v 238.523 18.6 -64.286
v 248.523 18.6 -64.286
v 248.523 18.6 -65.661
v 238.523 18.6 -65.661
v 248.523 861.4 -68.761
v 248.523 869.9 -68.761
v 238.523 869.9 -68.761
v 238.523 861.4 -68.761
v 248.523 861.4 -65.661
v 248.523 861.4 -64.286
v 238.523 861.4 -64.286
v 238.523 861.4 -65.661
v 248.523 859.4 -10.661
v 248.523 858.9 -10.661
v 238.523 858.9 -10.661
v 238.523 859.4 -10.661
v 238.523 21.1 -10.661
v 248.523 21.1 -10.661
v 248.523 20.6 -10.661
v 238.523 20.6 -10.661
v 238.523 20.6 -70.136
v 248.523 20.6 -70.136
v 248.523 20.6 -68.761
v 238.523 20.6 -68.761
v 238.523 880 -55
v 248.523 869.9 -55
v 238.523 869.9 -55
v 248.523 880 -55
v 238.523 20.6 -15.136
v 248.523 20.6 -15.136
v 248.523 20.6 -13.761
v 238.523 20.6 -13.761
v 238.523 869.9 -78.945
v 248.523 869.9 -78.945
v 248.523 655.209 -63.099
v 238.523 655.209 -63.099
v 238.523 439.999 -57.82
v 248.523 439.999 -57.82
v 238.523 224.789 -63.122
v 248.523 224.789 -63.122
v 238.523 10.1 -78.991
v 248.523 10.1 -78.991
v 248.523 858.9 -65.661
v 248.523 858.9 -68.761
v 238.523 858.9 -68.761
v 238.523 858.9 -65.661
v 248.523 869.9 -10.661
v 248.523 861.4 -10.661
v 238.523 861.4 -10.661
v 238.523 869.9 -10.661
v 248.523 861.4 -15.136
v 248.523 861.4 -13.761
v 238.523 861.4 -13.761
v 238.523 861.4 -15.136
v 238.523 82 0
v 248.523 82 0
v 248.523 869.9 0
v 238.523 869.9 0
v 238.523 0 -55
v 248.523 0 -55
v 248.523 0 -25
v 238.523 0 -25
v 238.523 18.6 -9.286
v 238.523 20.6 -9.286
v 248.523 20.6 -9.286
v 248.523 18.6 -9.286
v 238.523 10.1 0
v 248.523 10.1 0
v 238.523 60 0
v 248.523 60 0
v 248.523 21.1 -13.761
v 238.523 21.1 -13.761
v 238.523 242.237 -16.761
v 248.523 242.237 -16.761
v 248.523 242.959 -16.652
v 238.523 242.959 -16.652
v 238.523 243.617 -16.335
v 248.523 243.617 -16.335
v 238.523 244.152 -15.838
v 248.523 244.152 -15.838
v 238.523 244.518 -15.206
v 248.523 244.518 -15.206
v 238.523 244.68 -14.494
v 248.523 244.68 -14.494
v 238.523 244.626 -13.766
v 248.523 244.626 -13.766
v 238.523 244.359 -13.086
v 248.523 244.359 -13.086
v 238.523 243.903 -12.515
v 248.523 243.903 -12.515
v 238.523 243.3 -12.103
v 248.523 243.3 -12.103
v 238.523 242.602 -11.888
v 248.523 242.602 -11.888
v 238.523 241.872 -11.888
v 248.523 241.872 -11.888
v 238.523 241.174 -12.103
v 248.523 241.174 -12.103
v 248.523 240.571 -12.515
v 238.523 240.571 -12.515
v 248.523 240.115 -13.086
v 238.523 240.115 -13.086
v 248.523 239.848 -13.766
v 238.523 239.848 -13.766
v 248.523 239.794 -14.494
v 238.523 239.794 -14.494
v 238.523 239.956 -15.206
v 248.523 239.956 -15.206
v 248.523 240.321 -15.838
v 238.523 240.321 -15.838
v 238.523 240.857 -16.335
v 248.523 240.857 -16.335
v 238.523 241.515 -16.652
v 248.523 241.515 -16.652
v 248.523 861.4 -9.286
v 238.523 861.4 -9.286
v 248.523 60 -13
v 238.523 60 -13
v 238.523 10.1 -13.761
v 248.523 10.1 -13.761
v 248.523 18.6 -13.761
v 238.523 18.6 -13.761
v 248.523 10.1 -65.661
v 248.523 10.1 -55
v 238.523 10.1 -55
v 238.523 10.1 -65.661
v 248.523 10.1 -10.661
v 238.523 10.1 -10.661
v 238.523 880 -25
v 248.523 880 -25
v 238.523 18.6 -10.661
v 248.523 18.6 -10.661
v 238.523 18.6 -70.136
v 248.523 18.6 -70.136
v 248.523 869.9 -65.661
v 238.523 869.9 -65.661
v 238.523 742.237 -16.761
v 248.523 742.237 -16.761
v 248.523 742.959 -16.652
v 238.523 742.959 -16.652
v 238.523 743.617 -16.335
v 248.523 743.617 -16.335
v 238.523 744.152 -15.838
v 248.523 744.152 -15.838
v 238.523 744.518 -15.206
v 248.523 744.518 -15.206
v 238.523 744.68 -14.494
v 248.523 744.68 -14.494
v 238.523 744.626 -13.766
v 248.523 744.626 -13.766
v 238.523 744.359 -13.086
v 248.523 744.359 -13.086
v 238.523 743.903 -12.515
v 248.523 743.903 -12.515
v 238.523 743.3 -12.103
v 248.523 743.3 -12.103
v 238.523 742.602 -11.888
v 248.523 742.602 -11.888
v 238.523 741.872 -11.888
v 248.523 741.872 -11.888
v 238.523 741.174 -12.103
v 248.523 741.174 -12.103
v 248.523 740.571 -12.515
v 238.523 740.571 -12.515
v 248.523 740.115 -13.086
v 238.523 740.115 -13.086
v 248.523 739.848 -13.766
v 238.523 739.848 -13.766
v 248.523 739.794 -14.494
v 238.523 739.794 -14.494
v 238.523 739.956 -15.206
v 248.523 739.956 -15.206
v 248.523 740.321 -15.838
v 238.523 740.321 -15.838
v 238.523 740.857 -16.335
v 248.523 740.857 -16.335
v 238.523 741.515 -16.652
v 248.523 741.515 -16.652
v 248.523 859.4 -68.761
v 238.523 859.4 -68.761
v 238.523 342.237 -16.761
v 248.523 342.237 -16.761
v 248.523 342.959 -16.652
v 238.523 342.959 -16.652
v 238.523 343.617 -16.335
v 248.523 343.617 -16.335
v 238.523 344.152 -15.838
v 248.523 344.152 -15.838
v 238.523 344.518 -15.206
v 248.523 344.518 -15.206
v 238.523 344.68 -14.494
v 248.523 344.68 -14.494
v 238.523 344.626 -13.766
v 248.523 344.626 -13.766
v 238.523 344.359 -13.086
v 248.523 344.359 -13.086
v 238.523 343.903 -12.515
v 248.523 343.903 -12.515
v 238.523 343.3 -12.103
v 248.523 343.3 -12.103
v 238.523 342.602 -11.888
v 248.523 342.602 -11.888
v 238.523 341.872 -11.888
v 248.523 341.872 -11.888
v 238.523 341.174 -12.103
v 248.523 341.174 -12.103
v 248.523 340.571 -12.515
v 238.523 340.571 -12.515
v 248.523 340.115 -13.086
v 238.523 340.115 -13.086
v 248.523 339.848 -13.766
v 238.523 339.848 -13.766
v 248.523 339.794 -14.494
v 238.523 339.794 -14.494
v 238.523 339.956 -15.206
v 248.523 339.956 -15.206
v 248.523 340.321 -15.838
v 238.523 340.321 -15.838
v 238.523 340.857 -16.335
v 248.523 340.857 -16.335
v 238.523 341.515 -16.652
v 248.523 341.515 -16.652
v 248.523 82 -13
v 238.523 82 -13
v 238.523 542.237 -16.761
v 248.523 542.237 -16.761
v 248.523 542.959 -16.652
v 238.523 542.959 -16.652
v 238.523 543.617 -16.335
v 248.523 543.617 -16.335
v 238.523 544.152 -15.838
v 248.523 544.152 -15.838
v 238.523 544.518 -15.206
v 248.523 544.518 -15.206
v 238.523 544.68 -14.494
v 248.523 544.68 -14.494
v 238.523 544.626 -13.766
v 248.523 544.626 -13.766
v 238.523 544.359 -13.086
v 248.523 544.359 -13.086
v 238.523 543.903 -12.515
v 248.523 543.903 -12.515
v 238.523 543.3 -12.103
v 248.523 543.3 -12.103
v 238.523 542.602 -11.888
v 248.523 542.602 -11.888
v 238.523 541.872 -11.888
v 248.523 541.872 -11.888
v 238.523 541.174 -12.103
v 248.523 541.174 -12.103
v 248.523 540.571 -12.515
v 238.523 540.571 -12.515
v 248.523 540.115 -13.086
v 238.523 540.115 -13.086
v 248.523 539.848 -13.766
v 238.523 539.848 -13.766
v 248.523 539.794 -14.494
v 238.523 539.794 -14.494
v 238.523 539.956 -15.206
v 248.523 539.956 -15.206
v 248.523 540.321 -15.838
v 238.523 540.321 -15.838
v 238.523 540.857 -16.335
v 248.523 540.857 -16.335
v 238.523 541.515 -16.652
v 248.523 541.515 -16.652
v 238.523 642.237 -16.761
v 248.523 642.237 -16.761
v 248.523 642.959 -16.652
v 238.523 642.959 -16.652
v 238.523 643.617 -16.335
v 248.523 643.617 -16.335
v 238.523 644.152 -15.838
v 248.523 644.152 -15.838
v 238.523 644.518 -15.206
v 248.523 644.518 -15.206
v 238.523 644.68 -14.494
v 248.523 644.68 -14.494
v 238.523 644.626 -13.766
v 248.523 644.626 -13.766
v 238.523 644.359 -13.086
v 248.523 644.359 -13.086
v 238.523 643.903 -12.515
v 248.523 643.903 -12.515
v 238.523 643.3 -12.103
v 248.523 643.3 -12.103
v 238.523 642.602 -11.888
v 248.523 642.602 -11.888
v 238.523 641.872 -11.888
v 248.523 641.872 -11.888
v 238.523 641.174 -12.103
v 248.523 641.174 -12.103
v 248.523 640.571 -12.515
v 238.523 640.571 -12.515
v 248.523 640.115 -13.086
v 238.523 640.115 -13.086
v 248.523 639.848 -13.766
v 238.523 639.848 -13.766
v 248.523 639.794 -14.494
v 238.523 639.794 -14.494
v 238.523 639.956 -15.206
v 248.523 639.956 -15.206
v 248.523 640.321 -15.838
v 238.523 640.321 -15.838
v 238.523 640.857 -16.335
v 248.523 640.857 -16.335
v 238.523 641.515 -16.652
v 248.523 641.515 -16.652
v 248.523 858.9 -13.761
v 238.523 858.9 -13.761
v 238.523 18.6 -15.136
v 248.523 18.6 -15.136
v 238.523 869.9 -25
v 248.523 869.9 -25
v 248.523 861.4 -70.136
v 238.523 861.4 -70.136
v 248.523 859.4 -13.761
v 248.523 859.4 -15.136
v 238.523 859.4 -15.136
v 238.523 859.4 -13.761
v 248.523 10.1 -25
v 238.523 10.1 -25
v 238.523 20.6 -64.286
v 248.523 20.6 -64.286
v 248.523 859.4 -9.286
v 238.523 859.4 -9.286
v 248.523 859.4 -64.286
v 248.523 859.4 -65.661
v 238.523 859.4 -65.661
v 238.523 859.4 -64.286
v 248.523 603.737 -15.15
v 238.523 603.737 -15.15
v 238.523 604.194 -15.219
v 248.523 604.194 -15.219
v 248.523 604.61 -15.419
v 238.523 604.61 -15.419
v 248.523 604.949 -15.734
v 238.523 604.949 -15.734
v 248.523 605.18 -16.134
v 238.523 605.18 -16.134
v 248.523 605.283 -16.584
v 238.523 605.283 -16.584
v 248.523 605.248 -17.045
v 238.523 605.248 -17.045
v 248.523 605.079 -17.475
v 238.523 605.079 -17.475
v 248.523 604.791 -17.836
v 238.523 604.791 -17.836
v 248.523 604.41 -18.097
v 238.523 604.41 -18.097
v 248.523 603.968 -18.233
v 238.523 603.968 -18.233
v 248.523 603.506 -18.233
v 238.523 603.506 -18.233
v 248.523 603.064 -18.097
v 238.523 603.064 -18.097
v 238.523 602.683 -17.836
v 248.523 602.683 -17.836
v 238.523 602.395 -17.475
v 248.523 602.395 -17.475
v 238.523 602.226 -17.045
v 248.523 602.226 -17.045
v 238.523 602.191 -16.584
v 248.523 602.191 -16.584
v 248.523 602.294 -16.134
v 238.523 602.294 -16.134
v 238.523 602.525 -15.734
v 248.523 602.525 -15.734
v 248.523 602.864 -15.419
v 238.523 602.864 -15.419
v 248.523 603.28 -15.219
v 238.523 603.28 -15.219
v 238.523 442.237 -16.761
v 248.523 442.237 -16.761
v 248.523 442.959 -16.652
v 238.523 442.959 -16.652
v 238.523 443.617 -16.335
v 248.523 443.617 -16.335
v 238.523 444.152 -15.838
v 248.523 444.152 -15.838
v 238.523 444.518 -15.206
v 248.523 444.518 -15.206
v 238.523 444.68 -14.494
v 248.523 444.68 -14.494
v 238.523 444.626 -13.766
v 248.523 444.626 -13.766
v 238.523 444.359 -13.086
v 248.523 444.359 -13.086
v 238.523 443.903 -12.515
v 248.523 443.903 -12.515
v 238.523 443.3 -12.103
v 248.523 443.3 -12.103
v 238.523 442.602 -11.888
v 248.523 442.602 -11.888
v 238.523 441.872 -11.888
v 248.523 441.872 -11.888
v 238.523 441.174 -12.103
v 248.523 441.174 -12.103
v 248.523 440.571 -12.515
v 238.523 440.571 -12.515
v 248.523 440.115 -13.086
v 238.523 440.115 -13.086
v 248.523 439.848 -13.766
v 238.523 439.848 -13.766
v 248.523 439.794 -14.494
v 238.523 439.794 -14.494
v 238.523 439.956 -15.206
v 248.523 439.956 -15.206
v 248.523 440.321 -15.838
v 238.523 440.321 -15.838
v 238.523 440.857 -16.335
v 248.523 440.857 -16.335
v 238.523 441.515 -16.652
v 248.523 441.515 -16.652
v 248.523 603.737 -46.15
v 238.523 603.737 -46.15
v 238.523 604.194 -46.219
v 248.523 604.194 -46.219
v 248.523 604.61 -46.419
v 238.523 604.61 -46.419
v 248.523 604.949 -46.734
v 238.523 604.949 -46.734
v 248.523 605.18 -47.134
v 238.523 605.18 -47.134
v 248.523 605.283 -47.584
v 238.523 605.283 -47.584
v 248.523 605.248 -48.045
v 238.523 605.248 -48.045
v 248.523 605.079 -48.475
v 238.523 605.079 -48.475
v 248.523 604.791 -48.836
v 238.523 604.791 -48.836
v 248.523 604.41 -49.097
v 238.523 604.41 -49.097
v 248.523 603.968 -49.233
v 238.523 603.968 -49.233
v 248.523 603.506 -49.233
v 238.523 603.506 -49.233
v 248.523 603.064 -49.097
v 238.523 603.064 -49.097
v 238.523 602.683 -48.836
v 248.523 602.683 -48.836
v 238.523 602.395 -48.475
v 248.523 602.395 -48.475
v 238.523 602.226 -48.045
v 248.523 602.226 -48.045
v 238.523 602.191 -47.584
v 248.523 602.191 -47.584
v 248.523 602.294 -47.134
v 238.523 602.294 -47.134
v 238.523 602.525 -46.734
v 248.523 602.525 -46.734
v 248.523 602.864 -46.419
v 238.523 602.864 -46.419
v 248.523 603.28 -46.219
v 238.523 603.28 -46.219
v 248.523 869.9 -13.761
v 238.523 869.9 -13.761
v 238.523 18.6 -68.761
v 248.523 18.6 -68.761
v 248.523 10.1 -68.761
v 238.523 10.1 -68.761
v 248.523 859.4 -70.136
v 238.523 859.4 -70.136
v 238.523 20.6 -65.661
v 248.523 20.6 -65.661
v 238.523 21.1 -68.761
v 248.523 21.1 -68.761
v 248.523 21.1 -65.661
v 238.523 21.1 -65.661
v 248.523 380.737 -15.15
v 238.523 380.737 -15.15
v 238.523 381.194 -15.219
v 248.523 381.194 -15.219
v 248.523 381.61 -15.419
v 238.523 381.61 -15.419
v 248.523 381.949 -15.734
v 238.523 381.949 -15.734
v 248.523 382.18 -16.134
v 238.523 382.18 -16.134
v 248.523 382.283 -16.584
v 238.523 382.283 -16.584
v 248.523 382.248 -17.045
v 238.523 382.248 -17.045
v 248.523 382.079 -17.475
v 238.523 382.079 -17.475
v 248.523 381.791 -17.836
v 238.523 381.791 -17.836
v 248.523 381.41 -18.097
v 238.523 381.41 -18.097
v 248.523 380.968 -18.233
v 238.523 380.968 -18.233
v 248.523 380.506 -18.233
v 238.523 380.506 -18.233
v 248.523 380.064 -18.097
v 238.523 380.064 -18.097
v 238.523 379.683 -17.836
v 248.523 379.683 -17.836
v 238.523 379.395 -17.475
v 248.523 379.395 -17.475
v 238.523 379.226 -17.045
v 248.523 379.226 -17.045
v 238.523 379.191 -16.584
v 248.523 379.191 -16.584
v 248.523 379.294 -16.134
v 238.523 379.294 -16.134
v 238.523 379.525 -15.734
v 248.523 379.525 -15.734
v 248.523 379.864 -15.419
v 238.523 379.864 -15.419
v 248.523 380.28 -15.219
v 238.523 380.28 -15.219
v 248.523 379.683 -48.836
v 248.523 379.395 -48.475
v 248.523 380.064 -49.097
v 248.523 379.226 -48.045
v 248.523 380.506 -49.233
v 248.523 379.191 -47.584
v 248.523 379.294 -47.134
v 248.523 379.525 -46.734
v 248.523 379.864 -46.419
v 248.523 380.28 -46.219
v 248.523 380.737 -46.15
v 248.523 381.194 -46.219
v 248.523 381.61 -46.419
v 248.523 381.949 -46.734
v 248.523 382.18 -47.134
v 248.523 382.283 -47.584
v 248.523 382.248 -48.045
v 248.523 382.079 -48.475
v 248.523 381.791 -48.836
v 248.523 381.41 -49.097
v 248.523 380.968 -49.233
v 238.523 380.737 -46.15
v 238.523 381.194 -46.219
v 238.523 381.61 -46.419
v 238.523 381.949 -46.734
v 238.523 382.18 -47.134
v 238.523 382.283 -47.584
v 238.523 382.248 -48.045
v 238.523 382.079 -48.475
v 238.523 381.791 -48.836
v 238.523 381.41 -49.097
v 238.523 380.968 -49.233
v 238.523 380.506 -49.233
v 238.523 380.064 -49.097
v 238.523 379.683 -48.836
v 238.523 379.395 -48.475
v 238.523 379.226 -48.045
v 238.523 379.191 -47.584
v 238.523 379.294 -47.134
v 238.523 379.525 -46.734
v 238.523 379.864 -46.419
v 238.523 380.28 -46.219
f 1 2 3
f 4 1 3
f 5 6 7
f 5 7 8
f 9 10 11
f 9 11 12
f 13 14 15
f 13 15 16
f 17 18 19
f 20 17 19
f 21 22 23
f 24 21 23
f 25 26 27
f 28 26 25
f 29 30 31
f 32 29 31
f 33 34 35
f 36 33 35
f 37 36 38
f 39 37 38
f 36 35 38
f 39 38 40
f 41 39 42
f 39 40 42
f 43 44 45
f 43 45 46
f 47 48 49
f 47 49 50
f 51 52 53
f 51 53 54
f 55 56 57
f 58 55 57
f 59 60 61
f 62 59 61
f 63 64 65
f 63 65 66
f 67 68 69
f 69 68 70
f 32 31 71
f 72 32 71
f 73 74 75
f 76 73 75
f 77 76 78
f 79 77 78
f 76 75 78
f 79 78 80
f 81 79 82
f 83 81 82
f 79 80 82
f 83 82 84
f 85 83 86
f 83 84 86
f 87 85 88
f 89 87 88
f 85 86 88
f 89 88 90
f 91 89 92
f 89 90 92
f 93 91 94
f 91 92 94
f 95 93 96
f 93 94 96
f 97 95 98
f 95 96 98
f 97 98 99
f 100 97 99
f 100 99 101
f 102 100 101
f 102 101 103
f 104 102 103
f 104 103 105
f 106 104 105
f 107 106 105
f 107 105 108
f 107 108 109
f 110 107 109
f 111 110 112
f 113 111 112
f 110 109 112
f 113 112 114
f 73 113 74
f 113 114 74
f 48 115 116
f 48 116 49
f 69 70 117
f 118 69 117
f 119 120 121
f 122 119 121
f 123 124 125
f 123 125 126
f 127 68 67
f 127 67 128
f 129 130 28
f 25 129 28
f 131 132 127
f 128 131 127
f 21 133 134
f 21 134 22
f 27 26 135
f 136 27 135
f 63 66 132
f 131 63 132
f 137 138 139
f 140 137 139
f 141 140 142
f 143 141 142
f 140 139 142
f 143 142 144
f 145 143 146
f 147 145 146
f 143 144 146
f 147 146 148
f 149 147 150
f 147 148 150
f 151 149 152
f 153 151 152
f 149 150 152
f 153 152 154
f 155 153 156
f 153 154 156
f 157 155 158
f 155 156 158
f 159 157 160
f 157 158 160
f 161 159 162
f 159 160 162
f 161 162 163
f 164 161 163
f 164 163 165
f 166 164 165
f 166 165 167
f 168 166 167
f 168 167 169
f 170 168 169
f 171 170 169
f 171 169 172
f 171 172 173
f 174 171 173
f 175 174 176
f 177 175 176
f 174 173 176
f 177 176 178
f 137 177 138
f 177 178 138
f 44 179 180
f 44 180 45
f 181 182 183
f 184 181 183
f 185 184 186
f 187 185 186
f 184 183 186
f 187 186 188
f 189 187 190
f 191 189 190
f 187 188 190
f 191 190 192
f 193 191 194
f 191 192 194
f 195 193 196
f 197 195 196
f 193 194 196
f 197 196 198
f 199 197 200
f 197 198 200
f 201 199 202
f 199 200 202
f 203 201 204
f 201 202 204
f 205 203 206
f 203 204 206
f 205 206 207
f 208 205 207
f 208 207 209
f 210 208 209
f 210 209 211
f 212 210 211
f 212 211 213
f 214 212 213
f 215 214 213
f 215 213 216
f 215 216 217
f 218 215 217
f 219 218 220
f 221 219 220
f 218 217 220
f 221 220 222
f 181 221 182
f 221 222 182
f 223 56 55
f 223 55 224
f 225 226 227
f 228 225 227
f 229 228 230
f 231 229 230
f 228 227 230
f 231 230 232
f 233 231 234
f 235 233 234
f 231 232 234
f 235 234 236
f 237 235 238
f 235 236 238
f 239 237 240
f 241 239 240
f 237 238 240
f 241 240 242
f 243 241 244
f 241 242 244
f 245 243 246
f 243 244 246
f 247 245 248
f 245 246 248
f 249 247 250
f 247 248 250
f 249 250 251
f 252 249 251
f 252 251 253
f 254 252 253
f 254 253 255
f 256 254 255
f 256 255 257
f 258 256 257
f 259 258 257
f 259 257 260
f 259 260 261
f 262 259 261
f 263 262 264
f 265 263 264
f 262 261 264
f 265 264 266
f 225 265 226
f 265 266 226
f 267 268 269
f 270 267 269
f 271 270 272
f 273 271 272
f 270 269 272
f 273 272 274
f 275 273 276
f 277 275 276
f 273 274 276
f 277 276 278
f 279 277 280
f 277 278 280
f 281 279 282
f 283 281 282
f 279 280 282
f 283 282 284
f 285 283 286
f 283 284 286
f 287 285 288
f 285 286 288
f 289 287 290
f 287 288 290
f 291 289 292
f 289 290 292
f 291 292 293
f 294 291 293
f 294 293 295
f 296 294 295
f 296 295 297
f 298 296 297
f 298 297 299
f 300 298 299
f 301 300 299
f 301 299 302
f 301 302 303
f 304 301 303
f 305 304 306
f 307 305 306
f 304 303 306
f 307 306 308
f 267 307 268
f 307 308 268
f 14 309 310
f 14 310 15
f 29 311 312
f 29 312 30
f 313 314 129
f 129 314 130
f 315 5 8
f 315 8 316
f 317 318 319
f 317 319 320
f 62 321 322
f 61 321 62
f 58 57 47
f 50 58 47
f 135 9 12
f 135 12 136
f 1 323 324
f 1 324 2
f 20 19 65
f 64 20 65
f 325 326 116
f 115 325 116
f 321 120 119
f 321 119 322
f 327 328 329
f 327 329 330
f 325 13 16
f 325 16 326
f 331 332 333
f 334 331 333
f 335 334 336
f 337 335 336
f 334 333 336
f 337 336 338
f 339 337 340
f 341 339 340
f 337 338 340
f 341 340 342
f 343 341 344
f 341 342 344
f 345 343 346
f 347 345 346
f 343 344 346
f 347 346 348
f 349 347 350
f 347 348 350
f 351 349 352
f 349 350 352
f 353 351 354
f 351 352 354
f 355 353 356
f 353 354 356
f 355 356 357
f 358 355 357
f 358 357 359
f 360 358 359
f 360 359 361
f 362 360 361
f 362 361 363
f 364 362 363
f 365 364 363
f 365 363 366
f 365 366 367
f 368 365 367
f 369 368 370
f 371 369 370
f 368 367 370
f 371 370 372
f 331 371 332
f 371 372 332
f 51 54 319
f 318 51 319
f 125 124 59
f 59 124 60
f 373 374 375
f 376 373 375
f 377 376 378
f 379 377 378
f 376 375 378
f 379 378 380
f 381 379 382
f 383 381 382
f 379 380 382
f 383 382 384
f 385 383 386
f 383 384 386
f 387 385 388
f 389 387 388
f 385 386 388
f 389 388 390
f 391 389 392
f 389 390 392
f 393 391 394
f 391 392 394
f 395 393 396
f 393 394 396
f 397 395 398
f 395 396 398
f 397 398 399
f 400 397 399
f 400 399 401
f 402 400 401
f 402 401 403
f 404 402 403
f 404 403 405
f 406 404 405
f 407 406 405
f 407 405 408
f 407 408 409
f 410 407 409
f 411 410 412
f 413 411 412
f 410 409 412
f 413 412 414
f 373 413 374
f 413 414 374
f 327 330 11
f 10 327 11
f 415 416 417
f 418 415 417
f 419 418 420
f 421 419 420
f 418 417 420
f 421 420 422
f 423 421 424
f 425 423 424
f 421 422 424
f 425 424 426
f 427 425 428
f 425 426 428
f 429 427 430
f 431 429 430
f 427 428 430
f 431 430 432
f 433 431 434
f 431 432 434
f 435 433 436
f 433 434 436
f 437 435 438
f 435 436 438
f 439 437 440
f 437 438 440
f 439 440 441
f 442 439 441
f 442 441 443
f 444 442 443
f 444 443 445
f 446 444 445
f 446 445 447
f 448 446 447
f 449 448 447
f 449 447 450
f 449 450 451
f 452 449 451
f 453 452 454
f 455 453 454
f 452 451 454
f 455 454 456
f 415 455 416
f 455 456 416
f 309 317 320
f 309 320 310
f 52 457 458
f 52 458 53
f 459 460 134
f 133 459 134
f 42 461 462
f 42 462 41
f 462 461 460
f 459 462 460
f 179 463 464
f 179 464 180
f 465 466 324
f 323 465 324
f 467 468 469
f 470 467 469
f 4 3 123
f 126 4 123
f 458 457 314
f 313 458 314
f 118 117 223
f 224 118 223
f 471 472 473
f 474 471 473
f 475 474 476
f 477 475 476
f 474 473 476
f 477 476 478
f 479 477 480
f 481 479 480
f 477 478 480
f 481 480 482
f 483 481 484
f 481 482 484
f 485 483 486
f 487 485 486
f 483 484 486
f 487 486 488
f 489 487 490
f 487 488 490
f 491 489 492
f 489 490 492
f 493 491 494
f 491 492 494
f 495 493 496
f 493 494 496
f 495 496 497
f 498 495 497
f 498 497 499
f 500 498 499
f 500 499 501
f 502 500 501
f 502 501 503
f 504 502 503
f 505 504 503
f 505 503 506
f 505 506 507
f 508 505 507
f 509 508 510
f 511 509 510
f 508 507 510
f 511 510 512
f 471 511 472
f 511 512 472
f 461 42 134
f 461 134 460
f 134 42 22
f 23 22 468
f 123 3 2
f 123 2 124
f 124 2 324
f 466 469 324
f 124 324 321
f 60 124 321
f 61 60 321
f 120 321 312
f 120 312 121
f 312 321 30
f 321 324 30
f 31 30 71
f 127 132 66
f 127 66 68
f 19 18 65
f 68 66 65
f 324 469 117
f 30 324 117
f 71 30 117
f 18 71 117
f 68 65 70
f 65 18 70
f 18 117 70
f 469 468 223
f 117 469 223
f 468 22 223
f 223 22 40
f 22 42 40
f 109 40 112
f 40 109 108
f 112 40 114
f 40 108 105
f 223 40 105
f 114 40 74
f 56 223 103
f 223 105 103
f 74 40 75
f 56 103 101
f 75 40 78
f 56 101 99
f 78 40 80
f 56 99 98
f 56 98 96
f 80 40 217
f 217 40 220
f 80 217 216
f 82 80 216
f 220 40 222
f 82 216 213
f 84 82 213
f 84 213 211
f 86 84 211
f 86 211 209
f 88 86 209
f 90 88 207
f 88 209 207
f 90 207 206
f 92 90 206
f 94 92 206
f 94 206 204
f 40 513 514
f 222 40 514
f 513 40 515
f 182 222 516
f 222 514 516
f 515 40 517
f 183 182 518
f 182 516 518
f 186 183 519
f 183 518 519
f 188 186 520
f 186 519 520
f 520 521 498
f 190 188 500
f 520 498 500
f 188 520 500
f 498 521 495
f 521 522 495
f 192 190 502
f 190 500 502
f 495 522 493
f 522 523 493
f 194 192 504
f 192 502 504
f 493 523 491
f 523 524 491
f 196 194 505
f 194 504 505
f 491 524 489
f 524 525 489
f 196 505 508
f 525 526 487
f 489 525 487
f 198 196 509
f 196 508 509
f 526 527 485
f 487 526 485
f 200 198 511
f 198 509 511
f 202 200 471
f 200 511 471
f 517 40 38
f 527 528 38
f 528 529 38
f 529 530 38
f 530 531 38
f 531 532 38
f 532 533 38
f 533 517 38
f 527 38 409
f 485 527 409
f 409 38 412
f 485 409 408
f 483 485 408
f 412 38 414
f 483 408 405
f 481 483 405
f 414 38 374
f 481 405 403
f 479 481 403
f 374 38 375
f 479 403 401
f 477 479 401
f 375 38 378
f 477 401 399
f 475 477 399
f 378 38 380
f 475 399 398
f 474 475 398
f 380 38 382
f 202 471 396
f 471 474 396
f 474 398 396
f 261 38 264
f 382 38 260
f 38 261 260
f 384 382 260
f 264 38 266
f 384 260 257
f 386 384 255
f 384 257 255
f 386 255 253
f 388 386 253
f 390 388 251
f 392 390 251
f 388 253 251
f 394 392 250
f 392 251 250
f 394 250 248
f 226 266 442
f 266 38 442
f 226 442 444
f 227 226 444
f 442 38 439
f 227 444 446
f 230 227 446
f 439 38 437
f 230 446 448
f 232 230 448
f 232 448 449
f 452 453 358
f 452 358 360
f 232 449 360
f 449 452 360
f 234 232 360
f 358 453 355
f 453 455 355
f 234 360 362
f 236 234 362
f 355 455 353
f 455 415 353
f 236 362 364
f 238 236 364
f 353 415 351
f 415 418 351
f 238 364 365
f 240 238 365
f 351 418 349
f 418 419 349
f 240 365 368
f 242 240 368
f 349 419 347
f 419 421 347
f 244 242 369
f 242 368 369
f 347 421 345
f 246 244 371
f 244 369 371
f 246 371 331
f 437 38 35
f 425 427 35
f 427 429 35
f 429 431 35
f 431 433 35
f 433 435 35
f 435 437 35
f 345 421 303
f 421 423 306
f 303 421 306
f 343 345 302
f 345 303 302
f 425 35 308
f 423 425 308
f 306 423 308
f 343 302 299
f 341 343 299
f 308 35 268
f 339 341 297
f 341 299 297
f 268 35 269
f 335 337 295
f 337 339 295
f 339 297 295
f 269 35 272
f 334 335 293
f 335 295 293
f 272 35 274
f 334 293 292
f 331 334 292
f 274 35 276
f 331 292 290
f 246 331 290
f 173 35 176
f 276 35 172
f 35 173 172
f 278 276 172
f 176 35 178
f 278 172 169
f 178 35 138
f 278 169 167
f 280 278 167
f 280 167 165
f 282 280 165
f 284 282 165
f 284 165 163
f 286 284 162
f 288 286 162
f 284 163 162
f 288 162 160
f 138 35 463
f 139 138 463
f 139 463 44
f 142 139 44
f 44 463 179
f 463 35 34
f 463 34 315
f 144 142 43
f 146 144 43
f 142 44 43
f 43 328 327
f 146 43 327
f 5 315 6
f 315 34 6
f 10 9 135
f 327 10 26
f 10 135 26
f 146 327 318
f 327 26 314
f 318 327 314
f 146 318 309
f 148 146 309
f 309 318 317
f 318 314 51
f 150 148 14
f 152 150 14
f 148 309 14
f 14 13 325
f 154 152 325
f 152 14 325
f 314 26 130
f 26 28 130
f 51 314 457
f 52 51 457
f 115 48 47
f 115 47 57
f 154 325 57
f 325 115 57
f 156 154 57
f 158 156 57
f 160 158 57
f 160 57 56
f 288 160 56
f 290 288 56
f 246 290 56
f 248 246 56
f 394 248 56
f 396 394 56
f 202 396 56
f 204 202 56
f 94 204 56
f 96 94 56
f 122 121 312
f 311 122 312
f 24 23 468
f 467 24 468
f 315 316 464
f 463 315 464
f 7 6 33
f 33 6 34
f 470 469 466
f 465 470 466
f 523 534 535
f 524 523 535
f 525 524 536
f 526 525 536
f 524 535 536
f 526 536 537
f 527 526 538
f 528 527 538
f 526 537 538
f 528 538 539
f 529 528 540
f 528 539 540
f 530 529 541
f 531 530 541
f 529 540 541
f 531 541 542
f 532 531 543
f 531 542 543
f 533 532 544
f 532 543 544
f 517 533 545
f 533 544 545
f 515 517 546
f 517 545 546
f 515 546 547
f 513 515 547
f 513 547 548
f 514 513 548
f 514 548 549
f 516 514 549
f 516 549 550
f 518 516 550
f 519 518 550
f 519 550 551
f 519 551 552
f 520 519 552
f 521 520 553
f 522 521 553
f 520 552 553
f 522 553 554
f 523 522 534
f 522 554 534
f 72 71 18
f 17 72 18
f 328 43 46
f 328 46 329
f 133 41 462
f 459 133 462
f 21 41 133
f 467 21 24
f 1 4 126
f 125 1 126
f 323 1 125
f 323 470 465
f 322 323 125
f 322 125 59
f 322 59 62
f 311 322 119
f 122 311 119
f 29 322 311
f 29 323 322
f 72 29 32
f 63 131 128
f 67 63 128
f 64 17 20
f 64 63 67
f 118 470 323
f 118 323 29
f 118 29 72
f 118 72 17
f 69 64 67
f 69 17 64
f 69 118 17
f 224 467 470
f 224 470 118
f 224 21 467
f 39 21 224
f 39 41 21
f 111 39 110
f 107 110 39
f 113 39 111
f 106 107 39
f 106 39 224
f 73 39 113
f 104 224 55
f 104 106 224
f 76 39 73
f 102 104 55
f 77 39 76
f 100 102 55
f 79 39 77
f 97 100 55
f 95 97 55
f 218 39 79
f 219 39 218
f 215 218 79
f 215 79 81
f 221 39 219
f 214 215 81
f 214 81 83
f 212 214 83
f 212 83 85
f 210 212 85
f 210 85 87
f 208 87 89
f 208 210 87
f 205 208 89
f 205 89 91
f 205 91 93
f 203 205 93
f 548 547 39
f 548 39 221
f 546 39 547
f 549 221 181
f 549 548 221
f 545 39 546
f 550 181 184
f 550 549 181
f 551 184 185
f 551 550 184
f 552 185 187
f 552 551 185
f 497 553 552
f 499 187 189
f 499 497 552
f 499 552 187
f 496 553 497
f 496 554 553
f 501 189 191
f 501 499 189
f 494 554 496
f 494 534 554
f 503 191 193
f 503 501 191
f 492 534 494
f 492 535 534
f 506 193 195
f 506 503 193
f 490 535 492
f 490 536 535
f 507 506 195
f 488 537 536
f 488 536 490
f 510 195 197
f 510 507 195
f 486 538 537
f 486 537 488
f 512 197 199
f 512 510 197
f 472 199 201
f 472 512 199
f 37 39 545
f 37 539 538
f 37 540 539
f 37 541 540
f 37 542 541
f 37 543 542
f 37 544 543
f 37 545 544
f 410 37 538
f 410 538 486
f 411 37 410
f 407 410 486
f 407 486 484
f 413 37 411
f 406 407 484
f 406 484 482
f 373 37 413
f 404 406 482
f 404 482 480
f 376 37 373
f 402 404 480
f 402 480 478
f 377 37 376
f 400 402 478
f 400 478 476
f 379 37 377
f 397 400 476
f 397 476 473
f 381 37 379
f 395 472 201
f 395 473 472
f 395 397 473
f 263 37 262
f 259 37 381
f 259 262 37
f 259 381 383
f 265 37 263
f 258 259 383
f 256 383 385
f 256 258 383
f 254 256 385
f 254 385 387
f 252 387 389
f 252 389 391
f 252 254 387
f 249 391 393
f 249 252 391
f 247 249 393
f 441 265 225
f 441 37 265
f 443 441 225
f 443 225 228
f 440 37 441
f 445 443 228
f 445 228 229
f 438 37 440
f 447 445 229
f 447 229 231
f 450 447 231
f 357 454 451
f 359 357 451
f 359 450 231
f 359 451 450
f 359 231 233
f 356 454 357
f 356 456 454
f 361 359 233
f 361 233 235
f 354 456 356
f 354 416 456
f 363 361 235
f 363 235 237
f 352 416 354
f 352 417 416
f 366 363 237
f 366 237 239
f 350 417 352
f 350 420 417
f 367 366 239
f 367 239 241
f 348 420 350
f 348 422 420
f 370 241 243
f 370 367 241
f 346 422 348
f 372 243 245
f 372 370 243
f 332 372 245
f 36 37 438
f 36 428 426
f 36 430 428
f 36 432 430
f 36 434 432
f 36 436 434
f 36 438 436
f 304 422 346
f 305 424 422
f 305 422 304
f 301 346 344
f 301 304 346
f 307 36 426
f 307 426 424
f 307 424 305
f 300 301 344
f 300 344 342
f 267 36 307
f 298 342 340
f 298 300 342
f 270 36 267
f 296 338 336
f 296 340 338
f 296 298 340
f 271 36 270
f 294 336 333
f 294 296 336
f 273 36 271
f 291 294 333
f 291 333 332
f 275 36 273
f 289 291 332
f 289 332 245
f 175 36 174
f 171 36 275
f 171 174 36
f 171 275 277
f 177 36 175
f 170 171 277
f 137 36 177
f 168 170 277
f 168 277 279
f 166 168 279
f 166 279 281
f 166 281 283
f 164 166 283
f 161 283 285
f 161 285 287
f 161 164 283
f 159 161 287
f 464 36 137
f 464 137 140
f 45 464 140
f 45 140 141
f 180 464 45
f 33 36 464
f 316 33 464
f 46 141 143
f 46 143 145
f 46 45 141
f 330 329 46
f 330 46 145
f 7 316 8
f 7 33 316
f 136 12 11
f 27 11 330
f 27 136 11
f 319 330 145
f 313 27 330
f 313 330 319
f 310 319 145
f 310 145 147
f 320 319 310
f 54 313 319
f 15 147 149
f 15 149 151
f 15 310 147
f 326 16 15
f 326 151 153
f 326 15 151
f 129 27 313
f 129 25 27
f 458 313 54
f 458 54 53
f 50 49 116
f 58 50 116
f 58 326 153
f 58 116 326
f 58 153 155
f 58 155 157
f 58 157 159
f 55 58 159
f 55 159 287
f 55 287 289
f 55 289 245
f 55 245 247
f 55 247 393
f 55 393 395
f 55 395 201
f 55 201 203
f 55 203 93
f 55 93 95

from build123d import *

# Parameters (mm, degrees)
DODANIE_WYCI_GNI_CIE1_DEPTH = 10
SZKIC1_W                    = 30
SZKIC1_H                    = 10.1
SZKIC1_W_2                  = 25
WYTNIJ_WYCI_GNI_CIE1_DEPTH  = 10
WYTNIJ_WYCI_GNI_CIE2_DEPTH  = 10
SZYK_LINIOWY1_COUNT         = 2
SZYK_LINIOWY1_PITCH         = 55
SZKIC7_R                    = 2.45
WYTNIJ_WYCI_GNI_CIE5_DEPTH  = 10
SZYK_LINIOWY3_COUNT         = 6
SZYK_LINIOWY3_PITCH         = 100
SZKIC8_W                    = 13
SZKIC8_H                    = 22
WYTNIJ_WYCI_GNI_CIE6_DEPTH  = 10
LUSTRO1_COPY_1_DEPTH        = 10
SZKIC12_R                   = 1.55
WYTNIJ_WYCI_GNI_CIE7_DEPTH  = 10
SZYK_LINIOWY4_COUNT         = 2
SZYK_LINIOWY4_PITCH         = 223


with BuildPart() as part:
    # Szkic11 → Dodanie-wyciągnięcie1 (new body)
    with BuildSketch(Plane.ZY.offset(-248.52281754)):
        with BuildLine():
            Line((-79.001367167, 0), (0, 0))
            Line((0, 0), (0, 880))
            Line((0, 880), (-78.955177412, 880))
            Line((-78.955177412, 880), (-78.955177412, 870))
            ThreePointArc((-78.955177412, 870), (-57.819766969, 439.998863597), (-79.001367167, 10))
            Line((-79.001367167, 10), (-79.001367167, 0))
        make_face()
    extrude(amount=DODANIE_WYCI_GNI_CIE1_DEPTH)

    # Szkic1 → Wytnij-wyciągnięcie1 (cut)
    with BuildSketch(Plane(origin=(248.52281754, 0, 0), x_dir=(0, 0, -1), z_dir=(1, 0, 0))):
        with Locations((70, 874.95)):
            Rectangle(SZKIC1_W, SZKIC1_H)
        with Locations((12.5, 874.95)):
            Rectangle(SZKIC1_W_2, SZKIC1_H)
    wytnij_wyci_gni_cie1 = extrude(amount=-WYTNIJ_WYCI_GNI_CIE1_DEPTH, mode=Mode.SUBTRACT)

    # Szkic2 → Wytnij-wyciągnięcie2 (cut)
    with BuildSketch(Plane(origin=(248.52281754, 0, 0), x_dir=(0, 0, -1), z_dir=(1, 0, 0))):
        Polygon((10.660920663, 869.9), (13.760920663, 869.9), (13.760920663, 861.4), (15.135920663, 861.4), (15.135920663, 859.4), (13.760920663, 859.4), (13.760920663, 858.9), (10.660920663, 858.9), (10.660920663, 859.4), (9.285920663, 859.4), (9.285920663, 861.4), (10.660920663, 861.4), align=None)
    wytnij_wyci_gni_cie2 = extrude(amount=-WYTNIJ_WYCI_GNI_CIE2_DEPTH, mode=Mode.SUBTRACT)

    # Szyk liniowy1: Wytnij-wyciągnięcie2 ×2
    with Locations(*[(0, 0, -i * SZYK_LINIOWY1_PITCH) for i in range(1, SZYK_LINIOWY1_COUNT)]):
        add(wytnij_wyci_gni_cie2, mode=Mode.SUBTRACT)

    # Szkic7 → Wytnij-wyciągnięcie5 (cut)
    with BuildSketch(Plane(origin=(248.52281754, 0, 0), x_dir=(0, 0, -1), z_dir=(1, 0, 0))):
        with Locations((14.31069395, 742.236985413)):
            Circle(SZKIC7_R)
    wytnij_wyci_gni_cie5 = extrude(amount=-WYTNIJ_WYCI_GNI_CIE5_DEPTH, mode=Mode.SUBTRACT)

    # Szyk liniowy3: Wytnij-wyciągnięcie5 ×6
    with Locations(*[(0, -i * SZYK_LINIOWY3_PITCH, 0) for i in range(1, SZYK_LINIOWY3_COUNT)]):
        add(wytnij_wyci_gni_cie5, mode=Mode.SUBTRACT)

    # Szkic8 → Wytnij-wyciągnięcie6 (cut)
    with BuildSketch(Plane(origin=(248.52281754, 0, 0), x_dir=(0, 0, -1), z_dir=(1, 0, 0))):
        with Locations((6.5, 71)):
            Rectangle(SZKIC8_W, SZKIC8_H)
    extrude(amount=-WYTNIJ_WYCI_GNI_CIE6_DEPTH, mode=Mode.SUBTRACT)

    # Lustro1: Wytnij-wyciągnięcie1, Wytnij-wyciągnięcie2 across plane
    add(wytnij_wyci_gni_cie1.mirror(Plane.ZX.offset(440)), mode=Mode.SUBTRACT)
    add(wytnij_wyci_gni_cie2.mirror(Plane.ZX.offset(440)), mode=Mode.SUBTRACT)

    # Lustro1 copy 1 sketch → Lustro1 copy 1 (cut)
    with BuildSketch(Plane(origin=(248.52281754, 880, -55), x_dir=(0, 0, -1), z_dir=(1, 0, 0))):
        Polygon((10.660920663, -869.9), (13.760920663, -869.9), (13.760920663, -861.4), (15.135920663, -861.4), (15.135920663, -859.4), (13.760920663, -859.4), (13.760920663, -858.9), (10.660920663, -858.9), (10.660920663, -859.4), (9.285920663, -859.4), (9.285920663, -861.4), (10.660920663, -861.4), align=None)
    extrude(amount=-LUSTRO1_COPY_1_DEPTH, mode=Mode.SUBTRACT)

    # Szkic12 → Wytnij-wyciągnięcie7 (cut)
    with BuildSketch(Plane.ZY.offset(-238.52281754)):
        with Locations((-47.7, 380.736985413)):
            Circle(SZKIC12_R)
        with Locations((-16.7, 380.736985413)):
            Circle(SZKIC12_R)
    wytnij_wyci_gni_cie7 = extrude(amount=-WYTNIJ_WYCI_GNI_CIE7_DEPTH, mode=Mode.SUBTRACT)

    # Szyk liniowy4: Wytnij-wyciągnięcie7 ×2
    with Locations(*[(0, i * SZYK_LINIOWY4_PITCH, 0) for i in range(1, SZYK_LINIOWY4_COUNT)]):
        add(wytnij_wyci_gni_cie7, mode=Mode.SUBTRACT)


solid = part.part
